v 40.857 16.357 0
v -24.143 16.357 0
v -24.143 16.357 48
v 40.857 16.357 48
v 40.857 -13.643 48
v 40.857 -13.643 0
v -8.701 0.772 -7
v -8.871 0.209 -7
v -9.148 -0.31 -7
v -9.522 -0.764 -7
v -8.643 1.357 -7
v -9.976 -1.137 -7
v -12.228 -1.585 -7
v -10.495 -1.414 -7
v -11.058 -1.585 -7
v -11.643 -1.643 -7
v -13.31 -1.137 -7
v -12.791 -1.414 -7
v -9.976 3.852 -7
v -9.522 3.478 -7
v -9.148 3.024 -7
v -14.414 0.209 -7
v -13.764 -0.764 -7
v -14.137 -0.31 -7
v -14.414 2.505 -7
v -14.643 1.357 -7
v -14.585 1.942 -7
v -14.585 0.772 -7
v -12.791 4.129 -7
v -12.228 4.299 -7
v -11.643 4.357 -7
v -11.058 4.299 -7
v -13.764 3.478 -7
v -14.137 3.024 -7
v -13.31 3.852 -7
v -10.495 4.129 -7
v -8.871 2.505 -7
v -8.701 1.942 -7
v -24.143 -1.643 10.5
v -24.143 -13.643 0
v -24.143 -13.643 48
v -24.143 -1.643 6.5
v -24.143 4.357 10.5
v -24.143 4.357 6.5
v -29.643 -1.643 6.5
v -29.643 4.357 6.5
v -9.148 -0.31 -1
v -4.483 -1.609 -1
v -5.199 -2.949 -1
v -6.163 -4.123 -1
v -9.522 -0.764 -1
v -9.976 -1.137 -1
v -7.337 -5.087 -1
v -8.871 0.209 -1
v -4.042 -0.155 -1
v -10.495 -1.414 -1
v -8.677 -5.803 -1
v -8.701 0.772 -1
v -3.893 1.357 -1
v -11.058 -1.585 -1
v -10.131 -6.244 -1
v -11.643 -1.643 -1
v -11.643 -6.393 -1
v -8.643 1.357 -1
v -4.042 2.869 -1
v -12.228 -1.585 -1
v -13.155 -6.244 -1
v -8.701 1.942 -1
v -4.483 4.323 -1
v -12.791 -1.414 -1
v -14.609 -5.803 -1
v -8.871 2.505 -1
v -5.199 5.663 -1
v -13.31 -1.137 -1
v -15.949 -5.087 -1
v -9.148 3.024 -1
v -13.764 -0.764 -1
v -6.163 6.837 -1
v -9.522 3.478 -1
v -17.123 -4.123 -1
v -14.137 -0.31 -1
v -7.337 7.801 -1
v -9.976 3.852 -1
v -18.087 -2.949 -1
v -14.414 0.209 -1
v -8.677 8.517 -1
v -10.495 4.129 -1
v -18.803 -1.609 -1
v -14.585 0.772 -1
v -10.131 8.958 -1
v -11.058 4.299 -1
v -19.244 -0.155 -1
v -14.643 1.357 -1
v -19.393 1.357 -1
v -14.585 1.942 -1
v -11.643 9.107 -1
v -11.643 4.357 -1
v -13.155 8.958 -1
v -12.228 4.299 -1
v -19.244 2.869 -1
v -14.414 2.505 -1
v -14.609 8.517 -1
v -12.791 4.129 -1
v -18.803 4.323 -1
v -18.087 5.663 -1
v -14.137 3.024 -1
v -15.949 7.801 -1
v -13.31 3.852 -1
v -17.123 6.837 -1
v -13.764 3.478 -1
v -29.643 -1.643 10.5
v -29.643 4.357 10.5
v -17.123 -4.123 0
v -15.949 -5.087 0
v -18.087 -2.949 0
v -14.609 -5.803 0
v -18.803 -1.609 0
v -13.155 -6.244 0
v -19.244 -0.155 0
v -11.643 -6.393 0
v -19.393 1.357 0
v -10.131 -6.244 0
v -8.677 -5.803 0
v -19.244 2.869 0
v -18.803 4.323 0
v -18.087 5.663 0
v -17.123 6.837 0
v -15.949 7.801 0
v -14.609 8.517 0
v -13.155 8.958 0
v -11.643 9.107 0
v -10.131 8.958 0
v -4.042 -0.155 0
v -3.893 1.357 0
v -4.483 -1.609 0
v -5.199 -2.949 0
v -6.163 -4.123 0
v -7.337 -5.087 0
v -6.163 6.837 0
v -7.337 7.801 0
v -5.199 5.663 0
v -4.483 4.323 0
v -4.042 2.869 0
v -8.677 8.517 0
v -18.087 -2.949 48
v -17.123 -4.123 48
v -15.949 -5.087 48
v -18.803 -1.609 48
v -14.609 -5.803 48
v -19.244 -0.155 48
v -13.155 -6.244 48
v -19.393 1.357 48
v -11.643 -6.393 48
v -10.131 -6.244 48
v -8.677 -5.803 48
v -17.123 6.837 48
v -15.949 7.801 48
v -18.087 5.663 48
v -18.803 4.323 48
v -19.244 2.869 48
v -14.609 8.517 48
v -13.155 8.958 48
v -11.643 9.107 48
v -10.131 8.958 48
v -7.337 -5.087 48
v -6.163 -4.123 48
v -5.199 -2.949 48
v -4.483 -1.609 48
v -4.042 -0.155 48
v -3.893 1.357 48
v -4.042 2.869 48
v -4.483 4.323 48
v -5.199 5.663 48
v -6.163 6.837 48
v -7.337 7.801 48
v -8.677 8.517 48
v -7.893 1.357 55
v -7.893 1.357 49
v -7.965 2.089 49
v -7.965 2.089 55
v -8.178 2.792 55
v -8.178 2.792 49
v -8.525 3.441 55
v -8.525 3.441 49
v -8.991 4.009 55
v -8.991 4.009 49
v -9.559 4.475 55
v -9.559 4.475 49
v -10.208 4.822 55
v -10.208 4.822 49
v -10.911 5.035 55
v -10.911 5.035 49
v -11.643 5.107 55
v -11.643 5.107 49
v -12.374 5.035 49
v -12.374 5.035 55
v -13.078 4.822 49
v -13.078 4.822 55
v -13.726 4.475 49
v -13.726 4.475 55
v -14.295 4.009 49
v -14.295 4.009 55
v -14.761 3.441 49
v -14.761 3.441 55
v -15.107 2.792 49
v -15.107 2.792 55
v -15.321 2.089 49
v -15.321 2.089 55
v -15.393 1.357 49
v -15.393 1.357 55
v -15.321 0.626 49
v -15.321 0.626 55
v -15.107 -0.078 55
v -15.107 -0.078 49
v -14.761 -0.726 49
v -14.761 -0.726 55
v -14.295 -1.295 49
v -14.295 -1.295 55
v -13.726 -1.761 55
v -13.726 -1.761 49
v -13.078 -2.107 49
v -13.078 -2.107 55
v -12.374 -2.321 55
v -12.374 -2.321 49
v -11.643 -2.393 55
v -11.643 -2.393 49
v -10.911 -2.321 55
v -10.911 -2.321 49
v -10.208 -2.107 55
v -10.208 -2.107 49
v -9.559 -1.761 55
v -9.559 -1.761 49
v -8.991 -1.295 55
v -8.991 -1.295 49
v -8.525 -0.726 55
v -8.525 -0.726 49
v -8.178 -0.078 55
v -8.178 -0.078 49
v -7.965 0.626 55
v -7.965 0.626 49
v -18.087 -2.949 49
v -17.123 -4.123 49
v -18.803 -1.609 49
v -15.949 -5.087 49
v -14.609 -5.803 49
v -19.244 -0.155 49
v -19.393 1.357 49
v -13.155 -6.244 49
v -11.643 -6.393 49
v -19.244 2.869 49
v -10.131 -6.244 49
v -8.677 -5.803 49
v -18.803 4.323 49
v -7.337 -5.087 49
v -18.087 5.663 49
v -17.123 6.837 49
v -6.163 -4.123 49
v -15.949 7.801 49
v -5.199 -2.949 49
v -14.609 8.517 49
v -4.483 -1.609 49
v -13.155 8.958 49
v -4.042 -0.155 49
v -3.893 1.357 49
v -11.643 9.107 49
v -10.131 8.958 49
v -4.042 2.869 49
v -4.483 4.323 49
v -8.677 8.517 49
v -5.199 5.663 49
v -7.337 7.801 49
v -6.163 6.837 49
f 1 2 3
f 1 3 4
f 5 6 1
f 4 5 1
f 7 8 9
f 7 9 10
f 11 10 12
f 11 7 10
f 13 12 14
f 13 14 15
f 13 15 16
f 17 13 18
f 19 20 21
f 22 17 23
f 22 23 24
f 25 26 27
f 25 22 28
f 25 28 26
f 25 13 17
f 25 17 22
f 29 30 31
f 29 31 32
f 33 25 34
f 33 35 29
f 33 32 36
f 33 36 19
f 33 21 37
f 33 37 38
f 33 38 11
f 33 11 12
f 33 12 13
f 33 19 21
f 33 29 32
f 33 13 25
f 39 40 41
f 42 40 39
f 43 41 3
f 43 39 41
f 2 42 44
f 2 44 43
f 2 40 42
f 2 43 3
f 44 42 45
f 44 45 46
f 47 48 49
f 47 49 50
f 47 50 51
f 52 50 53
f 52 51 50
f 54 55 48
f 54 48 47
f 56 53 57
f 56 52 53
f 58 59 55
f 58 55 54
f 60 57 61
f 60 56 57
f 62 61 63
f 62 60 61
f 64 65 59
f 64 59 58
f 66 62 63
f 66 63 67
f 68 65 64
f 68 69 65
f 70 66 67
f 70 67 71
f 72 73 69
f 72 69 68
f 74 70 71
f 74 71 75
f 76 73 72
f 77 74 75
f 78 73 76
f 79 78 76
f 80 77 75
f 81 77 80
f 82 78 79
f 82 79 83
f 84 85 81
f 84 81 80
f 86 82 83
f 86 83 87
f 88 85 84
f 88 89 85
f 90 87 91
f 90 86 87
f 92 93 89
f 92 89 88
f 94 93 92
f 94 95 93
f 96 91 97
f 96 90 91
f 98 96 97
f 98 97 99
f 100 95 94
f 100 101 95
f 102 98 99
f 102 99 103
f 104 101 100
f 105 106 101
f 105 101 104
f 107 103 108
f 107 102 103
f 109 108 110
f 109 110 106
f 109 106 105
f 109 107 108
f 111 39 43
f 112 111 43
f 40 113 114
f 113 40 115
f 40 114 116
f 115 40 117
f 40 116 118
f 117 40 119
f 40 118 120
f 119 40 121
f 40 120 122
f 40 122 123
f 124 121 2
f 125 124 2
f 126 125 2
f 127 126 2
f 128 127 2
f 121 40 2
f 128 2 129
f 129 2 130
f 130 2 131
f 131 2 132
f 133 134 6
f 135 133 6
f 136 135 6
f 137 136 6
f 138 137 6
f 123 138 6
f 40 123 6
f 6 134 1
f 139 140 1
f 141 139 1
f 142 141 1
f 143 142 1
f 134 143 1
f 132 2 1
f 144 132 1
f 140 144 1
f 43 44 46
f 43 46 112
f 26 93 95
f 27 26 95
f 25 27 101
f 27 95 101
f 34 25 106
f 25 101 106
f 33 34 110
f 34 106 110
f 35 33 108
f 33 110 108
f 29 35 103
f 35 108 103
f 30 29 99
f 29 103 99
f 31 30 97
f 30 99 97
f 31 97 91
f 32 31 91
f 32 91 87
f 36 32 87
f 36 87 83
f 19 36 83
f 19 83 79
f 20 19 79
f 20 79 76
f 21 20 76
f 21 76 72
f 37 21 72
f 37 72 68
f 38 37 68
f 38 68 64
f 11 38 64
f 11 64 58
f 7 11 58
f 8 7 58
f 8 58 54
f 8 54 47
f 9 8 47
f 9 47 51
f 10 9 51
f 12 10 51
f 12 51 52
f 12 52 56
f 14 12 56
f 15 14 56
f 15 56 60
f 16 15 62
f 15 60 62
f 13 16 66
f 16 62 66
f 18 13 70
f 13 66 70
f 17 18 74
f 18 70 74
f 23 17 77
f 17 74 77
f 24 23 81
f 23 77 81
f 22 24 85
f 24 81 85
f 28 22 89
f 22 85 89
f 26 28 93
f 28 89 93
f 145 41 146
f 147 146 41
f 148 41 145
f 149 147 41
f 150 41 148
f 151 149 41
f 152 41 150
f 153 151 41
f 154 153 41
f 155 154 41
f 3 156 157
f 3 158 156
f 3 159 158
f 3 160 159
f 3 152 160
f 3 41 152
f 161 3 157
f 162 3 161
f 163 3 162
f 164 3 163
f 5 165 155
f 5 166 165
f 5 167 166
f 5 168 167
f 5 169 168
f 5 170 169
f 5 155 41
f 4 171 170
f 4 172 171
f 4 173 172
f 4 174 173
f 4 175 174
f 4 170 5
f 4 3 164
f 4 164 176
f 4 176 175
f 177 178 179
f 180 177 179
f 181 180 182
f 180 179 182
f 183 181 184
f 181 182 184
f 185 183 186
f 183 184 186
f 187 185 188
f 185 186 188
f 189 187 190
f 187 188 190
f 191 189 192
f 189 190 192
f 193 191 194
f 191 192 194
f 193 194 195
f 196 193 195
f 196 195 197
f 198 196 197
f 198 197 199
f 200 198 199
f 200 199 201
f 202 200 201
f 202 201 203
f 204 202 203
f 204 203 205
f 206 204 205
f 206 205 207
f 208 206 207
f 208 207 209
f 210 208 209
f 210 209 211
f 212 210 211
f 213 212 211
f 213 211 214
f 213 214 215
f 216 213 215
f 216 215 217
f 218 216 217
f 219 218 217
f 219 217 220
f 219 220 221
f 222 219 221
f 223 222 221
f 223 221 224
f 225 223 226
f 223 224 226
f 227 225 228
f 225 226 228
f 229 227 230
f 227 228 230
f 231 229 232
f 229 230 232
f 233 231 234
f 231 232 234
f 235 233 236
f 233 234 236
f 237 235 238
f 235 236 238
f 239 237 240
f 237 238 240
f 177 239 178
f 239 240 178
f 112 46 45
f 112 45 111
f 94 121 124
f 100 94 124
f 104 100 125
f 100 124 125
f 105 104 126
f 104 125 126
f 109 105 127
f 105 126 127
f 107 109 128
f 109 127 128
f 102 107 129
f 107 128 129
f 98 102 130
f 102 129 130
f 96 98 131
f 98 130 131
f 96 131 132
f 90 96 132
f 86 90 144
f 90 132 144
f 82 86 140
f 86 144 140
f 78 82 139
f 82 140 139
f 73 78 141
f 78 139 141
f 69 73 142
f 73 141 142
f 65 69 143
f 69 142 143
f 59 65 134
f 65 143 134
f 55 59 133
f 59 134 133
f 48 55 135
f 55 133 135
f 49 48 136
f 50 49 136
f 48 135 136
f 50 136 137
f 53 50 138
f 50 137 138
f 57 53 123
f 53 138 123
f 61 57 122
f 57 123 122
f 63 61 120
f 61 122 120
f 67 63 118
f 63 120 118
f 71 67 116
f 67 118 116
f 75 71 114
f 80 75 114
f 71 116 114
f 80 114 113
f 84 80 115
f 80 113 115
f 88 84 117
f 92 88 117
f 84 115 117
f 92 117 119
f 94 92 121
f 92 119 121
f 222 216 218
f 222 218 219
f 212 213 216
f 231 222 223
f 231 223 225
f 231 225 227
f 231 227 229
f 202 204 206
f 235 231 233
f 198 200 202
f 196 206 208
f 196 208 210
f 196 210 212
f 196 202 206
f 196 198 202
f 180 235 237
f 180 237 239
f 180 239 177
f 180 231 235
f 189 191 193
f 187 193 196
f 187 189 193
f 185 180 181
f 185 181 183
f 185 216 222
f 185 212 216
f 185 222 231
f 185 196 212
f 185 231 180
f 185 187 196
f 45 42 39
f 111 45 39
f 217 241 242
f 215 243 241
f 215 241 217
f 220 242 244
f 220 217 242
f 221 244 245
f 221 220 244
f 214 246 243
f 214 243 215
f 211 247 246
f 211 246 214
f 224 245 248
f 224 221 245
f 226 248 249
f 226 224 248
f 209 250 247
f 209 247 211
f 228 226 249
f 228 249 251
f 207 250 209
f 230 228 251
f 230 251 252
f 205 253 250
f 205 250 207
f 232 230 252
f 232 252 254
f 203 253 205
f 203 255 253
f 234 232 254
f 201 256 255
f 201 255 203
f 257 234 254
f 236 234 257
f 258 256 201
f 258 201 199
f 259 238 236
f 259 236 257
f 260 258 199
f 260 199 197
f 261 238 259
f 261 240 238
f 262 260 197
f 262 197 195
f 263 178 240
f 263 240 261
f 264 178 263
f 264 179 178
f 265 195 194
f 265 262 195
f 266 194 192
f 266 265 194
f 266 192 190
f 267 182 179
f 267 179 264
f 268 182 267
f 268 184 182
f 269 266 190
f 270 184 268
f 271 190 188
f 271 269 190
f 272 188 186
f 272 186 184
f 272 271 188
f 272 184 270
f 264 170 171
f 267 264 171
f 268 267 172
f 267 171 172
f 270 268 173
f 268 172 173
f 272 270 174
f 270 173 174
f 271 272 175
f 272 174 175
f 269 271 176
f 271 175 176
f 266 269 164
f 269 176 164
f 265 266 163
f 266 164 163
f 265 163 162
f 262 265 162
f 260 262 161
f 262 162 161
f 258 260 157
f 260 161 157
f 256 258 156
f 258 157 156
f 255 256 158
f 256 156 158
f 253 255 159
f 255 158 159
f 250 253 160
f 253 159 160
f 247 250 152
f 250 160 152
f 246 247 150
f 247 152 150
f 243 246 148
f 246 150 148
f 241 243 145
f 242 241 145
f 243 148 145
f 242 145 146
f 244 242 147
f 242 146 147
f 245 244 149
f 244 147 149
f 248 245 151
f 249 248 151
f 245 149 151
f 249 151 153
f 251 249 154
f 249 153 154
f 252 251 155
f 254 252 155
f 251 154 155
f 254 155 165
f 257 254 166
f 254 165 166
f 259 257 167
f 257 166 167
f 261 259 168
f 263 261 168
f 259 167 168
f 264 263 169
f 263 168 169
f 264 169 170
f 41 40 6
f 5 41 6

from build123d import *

# Parameters (mm, degrees)
SKETCH2_W           = 65
SKETCH2_H           = 30
BOSS_EXTRUDE1_DEPTH = 48
SKETCH3_R           = 3.75
BOSS_EXTRUDE2_DEPTH = 7
SKETCH4_R           = 7.75
BOSS_EXTRUDE3_DEPTH = 1
SKETCH5_R           = 3
BOSS_EXTRUDE6_DEPTH = 7
SKETCH7_R           = 7.75
BOSS_EXTRUDE7_DEPTH = 1
SKETCH8_W           = 4
SKETCH8_H           = 6
BOSS_EXTRUDE8_DEPTH = 5.5


with BuildPart() as part:
    # Sketch2 → Boss-Extrude1 (new body)
    with BuildSketch(Plane.XY):
        with Locations((8.357142857, 1.357142857)):
            Rectangle(SKETCH2_W, SKETCH2_H)
    extrude(amount=BOSS_EXTRUDE1_DEPTH)

    # Sketch3 → Boss-Extrude2 (add)
    with BuildSketch(Plane.XY.offset(48)):
        with Locations((-11.642857143, 1.357142857)):
            Circle(SKETCH3_R)
    extrude(amount=BOSS_EXTRUDE2_DEPTH)

    # Sketch4 → Boss-Extrude3 (add)
    with BuildSketch(Plane.XY.offset(48)):
        with Locations((-11.642857143, 1.357142857)):
            Circle(SKETCH4_R)
    extrude(amount=BOSS_EXTRUDE3_DEPTH)

    # Sketch5 → Boss-Extrude6 (add)
    with BuildSketch(Plane(origin=(0, 0, 0), x_dir=(-1, 0, 0), z_dir=(0, 0, -1))):
        with Locations((11.642857143, 1.357142857)):
            Circle(SKETCH5_R)
    extrude(amount=BOSS_EXTRUDE6_DEPTH)

    # Sketch7 → Boss-Extrude7 (add)
    with BuildSketch(Plane(origin=(0, 0, 0), x_dir=(-1, 0, 0), z_dir=(0, 0, -1))):
        with Locations((11.642857143, 1.357142857)):
            Circle(SKETCH7_R)
    extrude(amount=BOSS_EXTRUDE7_DEPTH)

    # Sketch8 → Boss-Extrude8 (add)
    with BuildSketch(Plane.ZY.offset(24.142857143)):
        with Locations((8.5, 1.357142857)):
            Rectangle(SKETCH8_W, SKETCH8_H)
    extrude(amount=BOSS_EXTRUDE8_DEPTH)


solid = part.part
